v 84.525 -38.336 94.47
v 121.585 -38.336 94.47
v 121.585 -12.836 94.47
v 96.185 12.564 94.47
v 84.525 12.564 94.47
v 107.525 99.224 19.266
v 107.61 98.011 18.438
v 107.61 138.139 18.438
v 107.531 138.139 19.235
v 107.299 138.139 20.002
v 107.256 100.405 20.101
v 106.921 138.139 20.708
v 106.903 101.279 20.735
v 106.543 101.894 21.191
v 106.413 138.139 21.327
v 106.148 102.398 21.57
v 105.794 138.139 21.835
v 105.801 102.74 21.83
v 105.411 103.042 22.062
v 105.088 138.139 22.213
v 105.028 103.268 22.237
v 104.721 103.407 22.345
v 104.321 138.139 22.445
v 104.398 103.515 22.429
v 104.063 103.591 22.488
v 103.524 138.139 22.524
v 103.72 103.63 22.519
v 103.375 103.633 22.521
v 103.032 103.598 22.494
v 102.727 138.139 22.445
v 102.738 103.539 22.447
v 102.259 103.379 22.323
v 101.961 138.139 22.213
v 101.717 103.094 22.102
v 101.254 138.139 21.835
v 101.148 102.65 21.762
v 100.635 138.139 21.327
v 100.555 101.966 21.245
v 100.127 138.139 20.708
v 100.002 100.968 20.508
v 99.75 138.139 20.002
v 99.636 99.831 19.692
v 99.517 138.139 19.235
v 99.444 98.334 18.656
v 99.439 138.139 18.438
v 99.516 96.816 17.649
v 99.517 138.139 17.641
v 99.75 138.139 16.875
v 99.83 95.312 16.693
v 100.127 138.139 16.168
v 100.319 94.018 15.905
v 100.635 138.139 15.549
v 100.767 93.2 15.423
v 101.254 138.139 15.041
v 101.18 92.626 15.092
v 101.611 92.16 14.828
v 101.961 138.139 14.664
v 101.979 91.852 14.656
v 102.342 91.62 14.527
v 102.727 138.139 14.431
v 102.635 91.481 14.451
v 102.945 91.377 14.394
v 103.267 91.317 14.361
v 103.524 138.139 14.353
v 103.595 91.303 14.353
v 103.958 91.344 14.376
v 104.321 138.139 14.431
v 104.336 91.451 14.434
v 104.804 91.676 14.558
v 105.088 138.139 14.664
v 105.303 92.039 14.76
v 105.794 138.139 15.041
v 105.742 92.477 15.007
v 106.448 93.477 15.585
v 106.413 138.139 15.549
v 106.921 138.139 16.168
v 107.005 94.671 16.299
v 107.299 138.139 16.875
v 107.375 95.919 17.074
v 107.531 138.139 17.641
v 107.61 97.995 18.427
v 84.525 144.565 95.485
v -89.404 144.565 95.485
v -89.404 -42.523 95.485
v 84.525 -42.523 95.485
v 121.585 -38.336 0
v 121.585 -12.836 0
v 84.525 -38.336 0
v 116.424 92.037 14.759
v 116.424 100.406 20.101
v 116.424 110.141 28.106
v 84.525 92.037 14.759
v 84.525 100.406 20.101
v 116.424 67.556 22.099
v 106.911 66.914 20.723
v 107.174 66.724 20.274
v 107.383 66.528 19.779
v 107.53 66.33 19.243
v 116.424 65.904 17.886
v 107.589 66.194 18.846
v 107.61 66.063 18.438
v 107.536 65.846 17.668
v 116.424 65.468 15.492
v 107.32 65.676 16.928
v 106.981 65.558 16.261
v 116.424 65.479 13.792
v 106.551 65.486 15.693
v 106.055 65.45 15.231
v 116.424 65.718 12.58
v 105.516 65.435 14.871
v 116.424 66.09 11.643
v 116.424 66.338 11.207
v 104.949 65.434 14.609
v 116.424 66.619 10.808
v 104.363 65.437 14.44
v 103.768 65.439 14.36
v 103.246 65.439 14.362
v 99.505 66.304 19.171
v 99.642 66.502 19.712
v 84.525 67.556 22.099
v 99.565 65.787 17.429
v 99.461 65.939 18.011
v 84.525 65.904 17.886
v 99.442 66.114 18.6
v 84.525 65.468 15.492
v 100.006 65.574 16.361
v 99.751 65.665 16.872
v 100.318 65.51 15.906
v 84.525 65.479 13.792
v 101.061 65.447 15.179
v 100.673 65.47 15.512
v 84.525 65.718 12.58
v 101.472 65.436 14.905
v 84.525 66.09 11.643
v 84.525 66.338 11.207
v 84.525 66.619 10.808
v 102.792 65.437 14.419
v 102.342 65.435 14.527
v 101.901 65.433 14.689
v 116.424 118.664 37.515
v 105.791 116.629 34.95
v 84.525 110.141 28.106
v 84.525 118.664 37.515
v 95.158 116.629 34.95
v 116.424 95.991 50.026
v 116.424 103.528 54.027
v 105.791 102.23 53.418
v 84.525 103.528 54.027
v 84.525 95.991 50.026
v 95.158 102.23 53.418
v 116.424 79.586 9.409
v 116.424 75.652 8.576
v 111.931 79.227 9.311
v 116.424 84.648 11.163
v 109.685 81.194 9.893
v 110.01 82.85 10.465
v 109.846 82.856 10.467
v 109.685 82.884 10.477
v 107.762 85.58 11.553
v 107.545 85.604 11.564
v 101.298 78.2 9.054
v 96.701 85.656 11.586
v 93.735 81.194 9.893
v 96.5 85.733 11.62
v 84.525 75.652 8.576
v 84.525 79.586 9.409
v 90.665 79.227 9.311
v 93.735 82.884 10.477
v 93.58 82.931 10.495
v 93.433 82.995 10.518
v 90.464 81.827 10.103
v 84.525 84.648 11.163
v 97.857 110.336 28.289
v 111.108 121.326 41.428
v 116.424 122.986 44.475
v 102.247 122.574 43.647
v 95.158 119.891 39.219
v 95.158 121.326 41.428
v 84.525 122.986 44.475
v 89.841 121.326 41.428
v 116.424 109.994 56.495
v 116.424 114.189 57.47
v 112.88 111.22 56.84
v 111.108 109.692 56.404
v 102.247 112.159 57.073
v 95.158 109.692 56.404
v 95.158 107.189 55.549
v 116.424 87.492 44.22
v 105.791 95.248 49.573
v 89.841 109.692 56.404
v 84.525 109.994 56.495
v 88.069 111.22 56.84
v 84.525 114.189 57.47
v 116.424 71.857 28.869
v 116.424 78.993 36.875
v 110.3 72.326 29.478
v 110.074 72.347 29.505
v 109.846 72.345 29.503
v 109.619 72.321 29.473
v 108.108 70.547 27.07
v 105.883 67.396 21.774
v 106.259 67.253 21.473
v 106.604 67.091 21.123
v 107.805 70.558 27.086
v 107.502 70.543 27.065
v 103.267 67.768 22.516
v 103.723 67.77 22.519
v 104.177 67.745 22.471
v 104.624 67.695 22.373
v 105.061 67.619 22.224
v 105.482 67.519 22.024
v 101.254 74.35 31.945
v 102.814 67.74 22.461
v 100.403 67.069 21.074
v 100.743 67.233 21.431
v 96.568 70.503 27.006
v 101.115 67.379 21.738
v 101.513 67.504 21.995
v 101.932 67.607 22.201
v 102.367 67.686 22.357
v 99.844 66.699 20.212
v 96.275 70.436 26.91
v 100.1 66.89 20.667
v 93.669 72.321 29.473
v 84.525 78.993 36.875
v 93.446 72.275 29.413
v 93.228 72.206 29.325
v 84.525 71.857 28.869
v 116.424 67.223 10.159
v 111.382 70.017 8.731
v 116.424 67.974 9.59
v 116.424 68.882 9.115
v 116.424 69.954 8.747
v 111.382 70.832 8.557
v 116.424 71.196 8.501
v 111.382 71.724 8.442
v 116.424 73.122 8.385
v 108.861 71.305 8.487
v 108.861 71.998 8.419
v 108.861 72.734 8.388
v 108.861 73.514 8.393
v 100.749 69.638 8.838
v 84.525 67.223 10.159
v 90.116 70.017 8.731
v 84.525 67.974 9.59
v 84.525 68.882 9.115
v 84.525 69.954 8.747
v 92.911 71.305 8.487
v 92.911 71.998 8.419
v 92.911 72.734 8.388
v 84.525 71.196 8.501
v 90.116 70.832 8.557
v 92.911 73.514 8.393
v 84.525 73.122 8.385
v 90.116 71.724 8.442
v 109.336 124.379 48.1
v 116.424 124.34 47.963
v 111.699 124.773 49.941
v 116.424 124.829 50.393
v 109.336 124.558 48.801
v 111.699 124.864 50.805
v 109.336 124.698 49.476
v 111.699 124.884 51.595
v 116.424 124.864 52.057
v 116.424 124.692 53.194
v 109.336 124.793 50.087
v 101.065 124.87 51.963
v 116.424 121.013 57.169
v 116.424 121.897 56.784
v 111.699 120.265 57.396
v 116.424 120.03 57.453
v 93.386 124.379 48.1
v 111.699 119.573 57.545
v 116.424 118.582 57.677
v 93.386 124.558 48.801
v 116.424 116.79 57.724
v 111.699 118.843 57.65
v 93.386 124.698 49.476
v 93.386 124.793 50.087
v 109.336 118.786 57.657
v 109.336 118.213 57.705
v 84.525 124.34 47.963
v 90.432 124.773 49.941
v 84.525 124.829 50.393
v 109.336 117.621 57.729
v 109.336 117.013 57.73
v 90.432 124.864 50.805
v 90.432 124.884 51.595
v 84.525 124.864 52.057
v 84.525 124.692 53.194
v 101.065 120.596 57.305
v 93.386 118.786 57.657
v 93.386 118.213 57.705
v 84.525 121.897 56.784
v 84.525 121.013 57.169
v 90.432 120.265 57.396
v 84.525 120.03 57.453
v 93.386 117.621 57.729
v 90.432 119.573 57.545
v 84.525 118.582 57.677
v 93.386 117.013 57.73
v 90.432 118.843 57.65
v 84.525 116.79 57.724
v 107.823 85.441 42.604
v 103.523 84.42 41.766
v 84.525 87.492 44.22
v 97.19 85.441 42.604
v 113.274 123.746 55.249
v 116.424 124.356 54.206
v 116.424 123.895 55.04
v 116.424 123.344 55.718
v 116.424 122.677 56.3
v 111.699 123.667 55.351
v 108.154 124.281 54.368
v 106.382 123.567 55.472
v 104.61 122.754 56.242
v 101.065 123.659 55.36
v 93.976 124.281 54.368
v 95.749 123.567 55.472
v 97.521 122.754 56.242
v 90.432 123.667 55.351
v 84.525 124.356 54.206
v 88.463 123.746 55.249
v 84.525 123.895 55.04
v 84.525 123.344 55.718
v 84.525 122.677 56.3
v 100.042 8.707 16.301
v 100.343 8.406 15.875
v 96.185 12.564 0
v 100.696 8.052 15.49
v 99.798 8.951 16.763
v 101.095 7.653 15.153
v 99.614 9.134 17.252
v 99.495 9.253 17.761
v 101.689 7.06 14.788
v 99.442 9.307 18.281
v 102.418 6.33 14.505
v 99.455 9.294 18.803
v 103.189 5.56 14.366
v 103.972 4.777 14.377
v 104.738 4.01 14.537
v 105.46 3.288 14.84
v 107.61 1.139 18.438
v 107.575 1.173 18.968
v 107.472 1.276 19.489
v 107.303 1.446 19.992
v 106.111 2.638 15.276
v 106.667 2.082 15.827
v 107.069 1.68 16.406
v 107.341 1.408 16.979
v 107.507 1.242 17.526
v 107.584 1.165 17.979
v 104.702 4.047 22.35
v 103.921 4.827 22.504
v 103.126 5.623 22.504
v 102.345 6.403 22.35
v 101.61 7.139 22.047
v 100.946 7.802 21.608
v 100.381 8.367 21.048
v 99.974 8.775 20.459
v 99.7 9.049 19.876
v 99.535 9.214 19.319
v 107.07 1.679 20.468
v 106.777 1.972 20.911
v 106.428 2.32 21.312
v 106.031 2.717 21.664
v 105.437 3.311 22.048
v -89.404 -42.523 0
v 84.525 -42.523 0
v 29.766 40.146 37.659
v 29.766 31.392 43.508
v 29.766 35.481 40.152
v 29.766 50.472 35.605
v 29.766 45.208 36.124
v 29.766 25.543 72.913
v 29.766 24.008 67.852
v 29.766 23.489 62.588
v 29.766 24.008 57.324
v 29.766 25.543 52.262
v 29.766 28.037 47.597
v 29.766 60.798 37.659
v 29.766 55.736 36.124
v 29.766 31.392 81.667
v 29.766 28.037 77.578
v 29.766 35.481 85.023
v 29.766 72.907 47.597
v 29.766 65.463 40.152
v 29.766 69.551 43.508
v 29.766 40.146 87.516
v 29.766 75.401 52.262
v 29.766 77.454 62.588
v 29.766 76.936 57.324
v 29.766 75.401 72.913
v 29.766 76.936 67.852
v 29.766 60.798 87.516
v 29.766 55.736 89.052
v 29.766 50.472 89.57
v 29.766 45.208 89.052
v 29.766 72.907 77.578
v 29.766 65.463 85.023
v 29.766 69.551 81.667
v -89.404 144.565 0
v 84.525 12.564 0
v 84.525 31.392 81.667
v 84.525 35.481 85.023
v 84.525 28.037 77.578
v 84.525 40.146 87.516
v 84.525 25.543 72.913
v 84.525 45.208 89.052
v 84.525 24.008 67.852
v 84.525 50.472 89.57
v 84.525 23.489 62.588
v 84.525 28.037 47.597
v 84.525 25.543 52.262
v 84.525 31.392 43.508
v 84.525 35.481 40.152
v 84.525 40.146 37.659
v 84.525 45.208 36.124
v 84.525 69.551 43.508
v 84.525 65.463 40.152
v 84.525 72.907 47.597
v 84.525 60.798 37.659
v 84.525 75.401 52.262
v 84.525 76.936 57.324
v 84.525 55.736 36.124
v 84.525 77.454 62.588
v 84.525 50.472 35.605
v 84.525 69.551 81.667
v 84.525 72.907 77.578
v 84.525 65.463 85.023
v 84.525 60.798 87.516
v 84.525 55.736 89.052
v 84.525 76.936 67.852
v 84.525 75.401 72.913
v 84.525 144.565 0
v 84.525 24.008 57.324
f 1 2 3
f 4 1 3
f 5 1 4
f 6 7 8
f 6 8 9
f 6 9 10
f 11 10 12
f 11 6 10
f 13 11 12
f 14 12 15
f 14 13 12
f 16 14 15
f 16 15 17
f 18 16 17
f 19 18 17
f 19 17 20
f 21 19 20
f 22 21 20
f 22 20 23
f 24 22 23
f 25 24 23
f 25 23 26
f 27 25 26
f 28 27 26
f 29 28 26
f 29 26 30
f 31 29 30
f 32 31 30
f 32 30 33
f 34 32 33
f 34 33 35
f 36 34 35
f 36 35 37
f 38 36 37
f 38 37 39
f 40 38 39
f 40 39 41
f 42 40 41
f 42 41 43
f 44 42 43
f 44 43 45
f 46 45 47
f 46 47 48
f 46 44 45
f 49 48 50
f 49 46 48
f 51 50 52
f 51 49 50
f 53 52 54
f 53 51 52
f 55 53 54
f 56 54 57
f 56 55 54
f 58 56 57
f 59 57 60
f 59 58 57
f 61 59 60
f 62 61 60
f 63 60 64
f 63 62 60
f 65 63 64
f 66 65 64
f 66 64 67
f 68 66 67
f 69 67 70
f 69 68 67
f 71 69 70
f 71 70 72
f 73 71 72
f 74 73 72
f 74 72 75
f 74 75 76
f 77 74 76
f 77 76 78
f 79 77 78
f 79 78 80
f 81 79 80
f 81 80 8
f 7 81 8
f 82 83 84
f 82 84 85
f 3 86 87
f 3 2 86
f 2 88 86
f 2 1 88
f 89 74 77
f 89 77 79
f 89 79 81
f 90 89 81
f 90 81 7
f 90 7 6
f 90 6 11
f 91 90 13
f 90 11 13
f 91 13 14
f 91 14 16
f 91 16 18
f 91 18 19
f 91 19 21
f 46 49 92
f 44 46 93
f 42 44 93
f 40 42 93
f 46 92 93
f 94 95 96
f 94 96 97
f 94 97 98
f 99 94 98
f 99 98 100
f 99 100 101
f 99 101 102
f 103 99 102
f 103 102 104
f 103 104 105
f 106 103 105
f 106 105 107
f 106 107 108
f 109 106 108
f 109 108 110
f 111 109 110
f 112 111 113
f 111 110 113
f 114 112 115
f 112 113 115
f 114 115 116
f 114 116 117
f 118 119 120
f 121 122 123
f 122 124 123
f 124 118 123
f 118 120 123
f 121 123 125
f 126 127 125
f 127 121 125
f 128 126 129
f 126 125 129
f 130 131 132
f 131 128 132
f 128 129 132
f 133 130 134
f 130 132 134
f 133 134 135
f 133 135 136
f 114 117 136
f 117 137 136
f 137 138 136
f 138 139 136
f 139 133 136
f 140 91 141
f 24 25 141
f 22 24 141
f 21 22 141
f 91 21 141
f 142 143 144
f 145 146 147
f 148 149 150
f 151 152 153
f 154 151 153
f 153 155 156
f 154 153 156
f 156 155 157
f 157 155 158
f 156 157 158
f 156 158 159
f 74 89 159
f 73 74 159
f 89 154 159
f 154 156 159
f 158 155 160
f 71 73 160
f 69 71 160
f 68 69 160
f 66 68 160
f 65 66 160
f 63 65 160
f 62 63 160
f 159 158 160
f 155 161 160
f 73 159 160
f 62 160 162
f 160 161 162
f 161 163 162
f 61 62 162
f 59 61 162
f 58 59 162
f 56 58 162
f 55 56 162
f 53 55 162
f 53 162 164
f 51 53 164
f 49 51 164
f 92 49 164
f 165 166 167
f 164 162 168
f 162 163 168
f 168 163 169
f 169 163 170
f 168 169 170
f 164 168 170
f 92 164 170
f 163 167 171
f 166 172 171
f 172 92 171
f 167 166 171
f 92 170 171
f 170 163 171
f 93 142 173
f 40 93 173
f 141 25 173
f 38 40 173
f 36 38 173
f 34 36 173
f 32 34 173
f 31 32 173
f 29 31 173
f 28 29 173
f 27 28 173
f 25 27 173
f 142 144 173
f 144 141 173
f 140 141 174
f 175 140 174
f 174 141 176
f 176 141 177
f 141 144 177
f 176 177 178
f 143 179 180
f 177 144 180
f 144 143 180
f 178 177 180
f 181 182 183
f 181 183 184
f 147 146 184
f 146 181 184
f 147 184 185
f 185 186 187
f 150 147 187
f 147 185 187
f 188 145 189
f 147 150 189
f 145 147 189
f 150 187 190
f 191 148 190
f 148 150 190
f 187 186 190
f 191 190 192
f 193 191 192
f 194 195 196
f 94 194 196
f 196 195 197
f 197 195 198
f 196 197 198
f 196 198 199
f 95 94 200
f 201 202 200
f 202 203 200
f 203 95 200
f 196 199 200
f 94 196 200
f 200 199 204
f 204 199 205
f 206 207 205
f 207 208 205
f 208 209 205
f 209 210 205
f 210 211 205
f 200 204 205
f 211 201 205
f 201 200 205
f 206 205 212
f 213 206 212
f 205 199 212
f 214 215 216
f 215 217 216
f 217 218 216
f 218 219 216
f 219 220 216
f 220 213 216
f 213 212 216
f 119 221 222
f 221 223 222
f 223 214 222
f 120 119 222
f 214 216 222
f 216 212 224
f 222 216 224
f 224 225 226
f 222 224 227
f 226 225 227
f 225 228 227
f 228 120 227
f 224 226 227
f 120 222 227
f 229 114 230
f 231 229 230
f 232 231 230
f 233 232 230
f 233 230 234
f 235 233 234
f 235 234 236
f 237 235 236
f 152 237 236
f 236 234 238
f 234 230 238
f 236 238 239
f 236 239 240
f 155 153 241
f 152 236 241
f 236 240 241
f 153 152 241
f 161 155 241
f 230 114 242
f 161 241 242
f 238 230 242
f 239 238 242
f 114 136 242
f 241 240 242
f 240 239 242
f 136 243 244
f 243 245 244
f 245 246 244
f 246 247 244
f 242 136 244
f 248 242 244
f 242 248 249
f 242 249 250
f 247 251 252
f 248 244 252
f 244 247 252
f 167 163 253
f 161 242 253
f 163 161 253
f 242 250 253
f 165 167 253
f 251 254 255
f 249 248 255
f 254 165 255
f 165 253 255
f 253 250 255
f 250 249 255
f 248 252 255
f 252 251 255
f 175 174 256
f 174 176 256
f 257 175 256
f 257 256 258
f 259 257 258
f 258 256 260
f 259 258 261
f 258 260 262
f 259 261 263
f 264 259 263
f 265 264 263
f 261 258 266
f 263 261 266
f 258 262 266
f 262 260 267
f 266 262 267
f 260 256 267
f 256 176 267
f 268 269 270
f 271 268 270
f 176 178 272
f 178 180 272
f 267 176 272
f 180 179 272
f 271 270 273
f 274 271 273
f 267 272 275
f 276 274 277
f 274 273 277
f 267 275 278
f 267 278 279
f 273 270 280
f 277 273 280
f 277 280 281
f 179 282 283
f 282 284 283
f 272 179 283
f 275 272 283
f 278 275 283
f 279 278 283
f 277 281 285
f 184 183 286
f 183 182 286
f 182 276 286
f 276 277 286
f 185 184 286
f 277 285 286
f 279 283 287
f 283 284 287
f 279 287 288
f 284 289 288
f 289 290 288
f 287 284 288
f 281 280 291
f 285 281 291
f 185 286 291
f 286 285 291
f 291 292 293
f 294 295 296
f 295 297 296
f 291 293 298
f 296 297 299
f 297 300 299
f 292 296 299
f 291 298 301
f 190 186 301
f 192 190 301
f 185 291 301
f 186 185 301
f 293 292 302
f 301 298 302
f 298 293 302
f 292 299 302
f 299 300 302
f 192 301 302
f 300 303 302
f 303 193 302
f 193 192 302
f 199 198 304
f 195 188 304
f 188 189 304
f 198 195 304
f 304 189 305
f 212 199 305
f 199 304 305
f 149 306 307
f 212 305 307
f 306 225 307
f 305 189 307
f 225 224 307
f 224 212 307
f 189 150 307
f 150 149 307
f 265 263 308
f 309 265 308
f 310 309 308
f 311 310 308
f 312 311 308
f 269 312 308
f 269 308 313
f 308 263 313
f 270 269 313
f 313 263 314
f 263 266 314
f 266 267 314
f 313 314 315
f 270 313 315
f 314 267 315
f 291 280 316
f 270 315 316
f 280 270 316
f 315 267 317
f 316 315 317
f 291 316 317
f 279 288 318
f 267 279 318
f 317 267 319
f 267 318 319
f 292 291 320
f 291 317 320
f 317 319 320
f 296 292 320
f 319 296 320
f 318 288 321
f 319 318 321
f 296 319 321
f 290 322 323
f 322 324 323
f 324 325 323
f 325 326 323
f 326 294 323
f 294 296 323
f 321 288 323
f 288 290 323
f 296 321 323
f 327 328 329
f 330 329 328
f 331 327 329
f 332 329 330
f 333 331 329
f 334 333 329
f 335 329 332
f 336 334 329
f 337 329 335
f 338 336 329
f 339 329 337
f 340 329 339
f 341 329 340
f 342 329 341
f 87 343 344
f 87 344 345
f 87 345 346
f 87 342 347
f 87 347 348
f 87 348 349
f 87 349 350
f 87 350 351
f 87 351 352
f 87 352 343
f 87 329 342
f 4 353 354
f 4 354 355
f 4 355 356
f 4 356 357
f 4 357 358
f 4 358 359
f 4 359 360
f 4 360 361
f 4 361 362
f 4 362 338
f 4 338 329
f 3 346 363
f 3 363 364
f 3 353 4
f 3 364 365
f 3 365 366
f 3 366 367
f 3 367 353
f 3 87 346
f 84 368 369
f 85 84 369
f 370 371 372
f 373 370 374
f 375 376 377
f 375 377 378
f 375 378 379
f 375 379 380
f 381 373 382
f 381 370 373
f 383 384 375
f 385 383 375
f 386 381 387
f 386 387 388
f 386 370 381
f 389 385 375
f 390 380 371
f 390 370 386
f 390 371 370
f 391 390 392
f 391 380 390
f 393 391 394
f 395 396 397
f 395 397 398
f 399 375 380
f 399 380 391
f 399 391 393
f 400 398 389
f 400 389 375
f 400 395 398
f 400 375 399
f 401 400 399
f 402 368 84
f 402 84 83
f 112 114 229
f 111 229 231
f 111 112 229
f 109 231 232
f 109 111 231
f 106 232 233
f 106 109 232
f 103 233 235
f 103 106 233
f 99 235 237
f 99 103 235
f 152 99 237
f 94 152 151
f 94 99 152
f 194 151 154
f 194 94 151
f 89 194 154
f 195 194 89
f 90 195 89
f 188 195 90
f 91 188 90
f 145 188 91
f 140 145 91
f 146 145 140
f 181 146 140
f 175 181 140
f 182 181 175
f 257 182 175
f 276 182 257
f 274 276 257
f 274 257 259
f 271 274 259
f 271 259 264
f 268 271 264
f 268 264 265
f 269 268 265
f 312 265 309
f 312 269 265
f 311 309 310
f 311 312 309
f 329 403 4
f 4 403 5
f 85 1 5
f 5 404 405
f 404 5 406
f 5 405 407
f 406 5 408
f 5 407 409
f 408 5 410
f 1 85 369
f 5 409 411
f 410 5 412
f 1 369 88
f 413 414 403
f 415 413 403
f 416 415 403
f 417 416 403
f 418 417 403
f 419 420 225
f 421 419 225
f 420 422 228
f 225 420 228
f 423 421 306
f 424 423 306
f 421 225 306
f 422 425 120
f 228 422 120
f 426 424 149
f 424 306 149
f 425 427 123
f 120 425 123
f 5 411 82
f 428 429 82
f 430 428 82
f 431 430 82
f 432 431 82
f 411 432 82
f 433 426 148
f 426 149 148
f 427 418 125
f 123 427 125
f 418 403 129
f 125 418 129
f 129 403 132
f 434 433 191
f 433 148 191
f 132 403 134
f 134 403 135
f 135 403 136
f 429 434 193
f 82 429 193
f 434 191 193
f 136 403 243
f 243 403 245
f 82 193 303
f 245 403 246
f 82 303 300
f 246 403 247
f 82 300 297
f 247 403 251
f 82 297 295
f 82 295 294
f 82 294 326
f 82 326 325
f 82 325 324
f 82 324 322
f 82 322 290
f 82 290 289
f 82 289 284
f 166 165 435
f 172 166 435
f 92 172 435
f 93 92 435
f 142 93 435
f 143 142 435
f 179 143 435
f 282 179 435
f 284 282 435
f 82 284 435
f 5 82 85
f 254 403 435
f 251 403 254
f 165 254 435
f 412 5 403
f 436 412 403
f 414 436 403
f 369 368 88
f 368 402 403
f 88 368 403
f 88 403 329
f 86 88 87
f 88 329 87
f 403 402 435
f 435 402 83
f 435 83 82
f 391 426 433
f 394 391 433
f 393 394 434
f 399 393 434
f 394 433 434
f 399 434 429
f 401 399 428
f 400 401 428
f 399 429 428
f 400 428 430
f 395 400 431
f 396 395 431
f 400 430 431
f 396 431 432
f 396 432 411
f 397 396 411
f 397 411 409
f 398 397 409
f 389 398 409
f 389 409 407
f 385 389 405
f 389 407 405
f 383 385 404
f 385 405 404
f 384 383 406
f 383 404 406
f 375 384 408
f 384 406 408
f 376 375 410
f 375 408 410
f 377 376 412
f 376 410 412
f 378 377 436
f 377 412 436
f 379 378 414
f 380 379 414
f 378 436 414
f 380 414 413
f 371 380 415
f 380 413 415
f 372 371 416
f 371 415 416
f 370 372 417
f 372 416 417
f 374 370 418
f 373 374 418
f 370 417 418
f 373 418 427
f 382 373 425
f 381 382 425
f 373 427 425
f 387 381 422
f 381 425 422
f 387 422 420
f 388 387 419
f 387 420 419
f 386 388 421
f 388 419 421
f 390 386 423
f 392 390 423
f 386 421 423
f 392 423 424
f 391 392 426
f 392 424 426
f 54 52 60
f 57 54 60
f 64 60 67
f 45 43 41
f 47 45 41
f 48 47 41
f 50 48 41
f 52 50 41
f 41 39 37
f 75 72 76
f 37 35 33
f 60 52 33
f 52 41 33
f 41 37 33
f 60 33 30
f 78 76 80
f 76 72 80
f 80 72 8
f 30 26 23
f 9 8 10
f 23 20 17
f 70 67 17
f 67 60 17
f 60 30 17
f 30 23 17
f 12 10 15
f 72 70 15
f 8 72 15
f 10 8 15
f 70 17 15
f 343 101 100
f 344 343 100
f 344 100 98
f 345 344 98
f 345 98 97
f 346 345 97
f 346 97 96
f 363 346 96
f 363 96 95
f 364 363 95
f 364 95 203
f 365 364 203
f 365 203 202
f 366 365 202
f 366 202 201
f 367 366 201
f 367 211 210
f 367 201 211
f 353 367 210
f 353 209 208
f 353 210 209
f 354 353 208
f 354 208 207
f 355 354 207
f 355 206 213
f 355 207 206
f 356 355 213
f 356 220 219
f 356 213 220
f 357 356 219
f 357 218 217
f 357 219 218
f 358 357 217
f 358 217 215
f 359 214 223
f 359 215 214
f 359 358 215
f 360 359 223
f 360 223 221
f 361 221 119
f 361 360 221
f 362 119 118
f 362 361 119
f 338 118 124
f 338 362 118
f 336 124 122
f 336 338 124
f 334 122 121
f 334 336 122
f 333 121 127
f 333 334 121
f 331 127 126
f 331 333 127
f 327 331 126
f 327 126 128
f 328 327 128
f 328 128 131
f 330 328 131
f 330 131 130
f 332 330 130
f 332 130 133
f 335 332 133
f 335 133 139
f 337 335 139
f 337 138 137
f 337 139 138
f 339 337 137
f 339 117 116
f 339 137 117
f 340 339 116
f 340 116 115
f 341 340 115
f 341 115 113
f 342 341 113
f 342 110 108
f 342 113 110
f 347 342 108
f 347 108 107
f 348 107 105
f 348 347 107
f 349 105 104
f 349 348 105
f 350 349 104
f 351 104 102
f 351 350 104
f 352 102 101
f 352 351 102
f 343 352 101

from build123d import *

# Parameters (mm, degrees)
F0_W      = 173.928797245
F0_H      = 187.0874911547
F1_DEPTH  = 95.48471
F3_DEPTH  = 31.89981
F4_R      = 26.9824905485
F5_DEPTH  = 54.75889
F6_W      = 50.8995316923
F6_H      = 94.4704711437
F7_DEPTH  = 37.06032
F8_SIZE   = 25.4
F9_R      = 4.0856018796
F10_DEPTH = 176.47482


with BuildPart() as f1:
    # F0 (on Top) → F1 (new body)
    with BuildSketch(Plane.XY):
        with Locations((-2.4397224188, 51.0212108493)):
            Rectangle(F0_W, F0_H)
    extrude(amount=F1_DEPTH)

    # F2 (on face) → F3 (join)
    with BuildSketch(Plane.YZ.offset(84.5246762037)):
        with BuildLine():
            add(Edge.make_bspline(
                [(66.6194483638, 10.8080217615), (81.0180202992, -7.6605326817), (116.6287906901, 34.9495930902), (152.2395610809, 77.5597188622), (102.2302187546, 53.4181475334), (52.2208764283, 29.2765762047), (66.6194483638, 10.8080217615)],
                knots=[0, 0, 0, 2.0943951024, 2.0943951024, 4.1887902048, 4.1887902048, 6.2831853072, 6.2831853072, 6.2831853072], degree=2, weights=[1, 0.5, 1, 0.5, 1, 0.5, 1]))
        make_face()
    extrude(amount=F3_DEPTH)

    # F4 (on face) → F5 (cut)
    with BuildSketch(Plane.YZ.offset(84.5246762037)):
        with Locations((50.47198385, 62.5876039267)):
            Circle(F4_R)
    extrude(amount=-F5_DEPTH, mode=Mode.SUBTRACT)

    # F6 (on face) → F7 (join)
    with BuildSketch(Plane.YZ.offset(84.5246762037)):
        with Locations((-12.8862280399, 47.2352355719)):
            Rectangle(F6_W, F6_H)
    extrude(amount=F7_DEPTH)

    # F8
    f8_edges = [f1.edges().sort_by_distance(p)[0] for p in [
        (121.584996, 12.563538, 47.235236),
    ]]
    chamfer(f8_edges, length=F8_SIZE)

    # F9 (on face) → F10 (join)
    with BuildSketch(Plane.XZ.offset(38.335993886)):
        with Locations((103.5241857171, 18.4381566942)):
            Circle(F9_R)
    extrude(amount=-F10_DEPTH)


solid = f1.part
